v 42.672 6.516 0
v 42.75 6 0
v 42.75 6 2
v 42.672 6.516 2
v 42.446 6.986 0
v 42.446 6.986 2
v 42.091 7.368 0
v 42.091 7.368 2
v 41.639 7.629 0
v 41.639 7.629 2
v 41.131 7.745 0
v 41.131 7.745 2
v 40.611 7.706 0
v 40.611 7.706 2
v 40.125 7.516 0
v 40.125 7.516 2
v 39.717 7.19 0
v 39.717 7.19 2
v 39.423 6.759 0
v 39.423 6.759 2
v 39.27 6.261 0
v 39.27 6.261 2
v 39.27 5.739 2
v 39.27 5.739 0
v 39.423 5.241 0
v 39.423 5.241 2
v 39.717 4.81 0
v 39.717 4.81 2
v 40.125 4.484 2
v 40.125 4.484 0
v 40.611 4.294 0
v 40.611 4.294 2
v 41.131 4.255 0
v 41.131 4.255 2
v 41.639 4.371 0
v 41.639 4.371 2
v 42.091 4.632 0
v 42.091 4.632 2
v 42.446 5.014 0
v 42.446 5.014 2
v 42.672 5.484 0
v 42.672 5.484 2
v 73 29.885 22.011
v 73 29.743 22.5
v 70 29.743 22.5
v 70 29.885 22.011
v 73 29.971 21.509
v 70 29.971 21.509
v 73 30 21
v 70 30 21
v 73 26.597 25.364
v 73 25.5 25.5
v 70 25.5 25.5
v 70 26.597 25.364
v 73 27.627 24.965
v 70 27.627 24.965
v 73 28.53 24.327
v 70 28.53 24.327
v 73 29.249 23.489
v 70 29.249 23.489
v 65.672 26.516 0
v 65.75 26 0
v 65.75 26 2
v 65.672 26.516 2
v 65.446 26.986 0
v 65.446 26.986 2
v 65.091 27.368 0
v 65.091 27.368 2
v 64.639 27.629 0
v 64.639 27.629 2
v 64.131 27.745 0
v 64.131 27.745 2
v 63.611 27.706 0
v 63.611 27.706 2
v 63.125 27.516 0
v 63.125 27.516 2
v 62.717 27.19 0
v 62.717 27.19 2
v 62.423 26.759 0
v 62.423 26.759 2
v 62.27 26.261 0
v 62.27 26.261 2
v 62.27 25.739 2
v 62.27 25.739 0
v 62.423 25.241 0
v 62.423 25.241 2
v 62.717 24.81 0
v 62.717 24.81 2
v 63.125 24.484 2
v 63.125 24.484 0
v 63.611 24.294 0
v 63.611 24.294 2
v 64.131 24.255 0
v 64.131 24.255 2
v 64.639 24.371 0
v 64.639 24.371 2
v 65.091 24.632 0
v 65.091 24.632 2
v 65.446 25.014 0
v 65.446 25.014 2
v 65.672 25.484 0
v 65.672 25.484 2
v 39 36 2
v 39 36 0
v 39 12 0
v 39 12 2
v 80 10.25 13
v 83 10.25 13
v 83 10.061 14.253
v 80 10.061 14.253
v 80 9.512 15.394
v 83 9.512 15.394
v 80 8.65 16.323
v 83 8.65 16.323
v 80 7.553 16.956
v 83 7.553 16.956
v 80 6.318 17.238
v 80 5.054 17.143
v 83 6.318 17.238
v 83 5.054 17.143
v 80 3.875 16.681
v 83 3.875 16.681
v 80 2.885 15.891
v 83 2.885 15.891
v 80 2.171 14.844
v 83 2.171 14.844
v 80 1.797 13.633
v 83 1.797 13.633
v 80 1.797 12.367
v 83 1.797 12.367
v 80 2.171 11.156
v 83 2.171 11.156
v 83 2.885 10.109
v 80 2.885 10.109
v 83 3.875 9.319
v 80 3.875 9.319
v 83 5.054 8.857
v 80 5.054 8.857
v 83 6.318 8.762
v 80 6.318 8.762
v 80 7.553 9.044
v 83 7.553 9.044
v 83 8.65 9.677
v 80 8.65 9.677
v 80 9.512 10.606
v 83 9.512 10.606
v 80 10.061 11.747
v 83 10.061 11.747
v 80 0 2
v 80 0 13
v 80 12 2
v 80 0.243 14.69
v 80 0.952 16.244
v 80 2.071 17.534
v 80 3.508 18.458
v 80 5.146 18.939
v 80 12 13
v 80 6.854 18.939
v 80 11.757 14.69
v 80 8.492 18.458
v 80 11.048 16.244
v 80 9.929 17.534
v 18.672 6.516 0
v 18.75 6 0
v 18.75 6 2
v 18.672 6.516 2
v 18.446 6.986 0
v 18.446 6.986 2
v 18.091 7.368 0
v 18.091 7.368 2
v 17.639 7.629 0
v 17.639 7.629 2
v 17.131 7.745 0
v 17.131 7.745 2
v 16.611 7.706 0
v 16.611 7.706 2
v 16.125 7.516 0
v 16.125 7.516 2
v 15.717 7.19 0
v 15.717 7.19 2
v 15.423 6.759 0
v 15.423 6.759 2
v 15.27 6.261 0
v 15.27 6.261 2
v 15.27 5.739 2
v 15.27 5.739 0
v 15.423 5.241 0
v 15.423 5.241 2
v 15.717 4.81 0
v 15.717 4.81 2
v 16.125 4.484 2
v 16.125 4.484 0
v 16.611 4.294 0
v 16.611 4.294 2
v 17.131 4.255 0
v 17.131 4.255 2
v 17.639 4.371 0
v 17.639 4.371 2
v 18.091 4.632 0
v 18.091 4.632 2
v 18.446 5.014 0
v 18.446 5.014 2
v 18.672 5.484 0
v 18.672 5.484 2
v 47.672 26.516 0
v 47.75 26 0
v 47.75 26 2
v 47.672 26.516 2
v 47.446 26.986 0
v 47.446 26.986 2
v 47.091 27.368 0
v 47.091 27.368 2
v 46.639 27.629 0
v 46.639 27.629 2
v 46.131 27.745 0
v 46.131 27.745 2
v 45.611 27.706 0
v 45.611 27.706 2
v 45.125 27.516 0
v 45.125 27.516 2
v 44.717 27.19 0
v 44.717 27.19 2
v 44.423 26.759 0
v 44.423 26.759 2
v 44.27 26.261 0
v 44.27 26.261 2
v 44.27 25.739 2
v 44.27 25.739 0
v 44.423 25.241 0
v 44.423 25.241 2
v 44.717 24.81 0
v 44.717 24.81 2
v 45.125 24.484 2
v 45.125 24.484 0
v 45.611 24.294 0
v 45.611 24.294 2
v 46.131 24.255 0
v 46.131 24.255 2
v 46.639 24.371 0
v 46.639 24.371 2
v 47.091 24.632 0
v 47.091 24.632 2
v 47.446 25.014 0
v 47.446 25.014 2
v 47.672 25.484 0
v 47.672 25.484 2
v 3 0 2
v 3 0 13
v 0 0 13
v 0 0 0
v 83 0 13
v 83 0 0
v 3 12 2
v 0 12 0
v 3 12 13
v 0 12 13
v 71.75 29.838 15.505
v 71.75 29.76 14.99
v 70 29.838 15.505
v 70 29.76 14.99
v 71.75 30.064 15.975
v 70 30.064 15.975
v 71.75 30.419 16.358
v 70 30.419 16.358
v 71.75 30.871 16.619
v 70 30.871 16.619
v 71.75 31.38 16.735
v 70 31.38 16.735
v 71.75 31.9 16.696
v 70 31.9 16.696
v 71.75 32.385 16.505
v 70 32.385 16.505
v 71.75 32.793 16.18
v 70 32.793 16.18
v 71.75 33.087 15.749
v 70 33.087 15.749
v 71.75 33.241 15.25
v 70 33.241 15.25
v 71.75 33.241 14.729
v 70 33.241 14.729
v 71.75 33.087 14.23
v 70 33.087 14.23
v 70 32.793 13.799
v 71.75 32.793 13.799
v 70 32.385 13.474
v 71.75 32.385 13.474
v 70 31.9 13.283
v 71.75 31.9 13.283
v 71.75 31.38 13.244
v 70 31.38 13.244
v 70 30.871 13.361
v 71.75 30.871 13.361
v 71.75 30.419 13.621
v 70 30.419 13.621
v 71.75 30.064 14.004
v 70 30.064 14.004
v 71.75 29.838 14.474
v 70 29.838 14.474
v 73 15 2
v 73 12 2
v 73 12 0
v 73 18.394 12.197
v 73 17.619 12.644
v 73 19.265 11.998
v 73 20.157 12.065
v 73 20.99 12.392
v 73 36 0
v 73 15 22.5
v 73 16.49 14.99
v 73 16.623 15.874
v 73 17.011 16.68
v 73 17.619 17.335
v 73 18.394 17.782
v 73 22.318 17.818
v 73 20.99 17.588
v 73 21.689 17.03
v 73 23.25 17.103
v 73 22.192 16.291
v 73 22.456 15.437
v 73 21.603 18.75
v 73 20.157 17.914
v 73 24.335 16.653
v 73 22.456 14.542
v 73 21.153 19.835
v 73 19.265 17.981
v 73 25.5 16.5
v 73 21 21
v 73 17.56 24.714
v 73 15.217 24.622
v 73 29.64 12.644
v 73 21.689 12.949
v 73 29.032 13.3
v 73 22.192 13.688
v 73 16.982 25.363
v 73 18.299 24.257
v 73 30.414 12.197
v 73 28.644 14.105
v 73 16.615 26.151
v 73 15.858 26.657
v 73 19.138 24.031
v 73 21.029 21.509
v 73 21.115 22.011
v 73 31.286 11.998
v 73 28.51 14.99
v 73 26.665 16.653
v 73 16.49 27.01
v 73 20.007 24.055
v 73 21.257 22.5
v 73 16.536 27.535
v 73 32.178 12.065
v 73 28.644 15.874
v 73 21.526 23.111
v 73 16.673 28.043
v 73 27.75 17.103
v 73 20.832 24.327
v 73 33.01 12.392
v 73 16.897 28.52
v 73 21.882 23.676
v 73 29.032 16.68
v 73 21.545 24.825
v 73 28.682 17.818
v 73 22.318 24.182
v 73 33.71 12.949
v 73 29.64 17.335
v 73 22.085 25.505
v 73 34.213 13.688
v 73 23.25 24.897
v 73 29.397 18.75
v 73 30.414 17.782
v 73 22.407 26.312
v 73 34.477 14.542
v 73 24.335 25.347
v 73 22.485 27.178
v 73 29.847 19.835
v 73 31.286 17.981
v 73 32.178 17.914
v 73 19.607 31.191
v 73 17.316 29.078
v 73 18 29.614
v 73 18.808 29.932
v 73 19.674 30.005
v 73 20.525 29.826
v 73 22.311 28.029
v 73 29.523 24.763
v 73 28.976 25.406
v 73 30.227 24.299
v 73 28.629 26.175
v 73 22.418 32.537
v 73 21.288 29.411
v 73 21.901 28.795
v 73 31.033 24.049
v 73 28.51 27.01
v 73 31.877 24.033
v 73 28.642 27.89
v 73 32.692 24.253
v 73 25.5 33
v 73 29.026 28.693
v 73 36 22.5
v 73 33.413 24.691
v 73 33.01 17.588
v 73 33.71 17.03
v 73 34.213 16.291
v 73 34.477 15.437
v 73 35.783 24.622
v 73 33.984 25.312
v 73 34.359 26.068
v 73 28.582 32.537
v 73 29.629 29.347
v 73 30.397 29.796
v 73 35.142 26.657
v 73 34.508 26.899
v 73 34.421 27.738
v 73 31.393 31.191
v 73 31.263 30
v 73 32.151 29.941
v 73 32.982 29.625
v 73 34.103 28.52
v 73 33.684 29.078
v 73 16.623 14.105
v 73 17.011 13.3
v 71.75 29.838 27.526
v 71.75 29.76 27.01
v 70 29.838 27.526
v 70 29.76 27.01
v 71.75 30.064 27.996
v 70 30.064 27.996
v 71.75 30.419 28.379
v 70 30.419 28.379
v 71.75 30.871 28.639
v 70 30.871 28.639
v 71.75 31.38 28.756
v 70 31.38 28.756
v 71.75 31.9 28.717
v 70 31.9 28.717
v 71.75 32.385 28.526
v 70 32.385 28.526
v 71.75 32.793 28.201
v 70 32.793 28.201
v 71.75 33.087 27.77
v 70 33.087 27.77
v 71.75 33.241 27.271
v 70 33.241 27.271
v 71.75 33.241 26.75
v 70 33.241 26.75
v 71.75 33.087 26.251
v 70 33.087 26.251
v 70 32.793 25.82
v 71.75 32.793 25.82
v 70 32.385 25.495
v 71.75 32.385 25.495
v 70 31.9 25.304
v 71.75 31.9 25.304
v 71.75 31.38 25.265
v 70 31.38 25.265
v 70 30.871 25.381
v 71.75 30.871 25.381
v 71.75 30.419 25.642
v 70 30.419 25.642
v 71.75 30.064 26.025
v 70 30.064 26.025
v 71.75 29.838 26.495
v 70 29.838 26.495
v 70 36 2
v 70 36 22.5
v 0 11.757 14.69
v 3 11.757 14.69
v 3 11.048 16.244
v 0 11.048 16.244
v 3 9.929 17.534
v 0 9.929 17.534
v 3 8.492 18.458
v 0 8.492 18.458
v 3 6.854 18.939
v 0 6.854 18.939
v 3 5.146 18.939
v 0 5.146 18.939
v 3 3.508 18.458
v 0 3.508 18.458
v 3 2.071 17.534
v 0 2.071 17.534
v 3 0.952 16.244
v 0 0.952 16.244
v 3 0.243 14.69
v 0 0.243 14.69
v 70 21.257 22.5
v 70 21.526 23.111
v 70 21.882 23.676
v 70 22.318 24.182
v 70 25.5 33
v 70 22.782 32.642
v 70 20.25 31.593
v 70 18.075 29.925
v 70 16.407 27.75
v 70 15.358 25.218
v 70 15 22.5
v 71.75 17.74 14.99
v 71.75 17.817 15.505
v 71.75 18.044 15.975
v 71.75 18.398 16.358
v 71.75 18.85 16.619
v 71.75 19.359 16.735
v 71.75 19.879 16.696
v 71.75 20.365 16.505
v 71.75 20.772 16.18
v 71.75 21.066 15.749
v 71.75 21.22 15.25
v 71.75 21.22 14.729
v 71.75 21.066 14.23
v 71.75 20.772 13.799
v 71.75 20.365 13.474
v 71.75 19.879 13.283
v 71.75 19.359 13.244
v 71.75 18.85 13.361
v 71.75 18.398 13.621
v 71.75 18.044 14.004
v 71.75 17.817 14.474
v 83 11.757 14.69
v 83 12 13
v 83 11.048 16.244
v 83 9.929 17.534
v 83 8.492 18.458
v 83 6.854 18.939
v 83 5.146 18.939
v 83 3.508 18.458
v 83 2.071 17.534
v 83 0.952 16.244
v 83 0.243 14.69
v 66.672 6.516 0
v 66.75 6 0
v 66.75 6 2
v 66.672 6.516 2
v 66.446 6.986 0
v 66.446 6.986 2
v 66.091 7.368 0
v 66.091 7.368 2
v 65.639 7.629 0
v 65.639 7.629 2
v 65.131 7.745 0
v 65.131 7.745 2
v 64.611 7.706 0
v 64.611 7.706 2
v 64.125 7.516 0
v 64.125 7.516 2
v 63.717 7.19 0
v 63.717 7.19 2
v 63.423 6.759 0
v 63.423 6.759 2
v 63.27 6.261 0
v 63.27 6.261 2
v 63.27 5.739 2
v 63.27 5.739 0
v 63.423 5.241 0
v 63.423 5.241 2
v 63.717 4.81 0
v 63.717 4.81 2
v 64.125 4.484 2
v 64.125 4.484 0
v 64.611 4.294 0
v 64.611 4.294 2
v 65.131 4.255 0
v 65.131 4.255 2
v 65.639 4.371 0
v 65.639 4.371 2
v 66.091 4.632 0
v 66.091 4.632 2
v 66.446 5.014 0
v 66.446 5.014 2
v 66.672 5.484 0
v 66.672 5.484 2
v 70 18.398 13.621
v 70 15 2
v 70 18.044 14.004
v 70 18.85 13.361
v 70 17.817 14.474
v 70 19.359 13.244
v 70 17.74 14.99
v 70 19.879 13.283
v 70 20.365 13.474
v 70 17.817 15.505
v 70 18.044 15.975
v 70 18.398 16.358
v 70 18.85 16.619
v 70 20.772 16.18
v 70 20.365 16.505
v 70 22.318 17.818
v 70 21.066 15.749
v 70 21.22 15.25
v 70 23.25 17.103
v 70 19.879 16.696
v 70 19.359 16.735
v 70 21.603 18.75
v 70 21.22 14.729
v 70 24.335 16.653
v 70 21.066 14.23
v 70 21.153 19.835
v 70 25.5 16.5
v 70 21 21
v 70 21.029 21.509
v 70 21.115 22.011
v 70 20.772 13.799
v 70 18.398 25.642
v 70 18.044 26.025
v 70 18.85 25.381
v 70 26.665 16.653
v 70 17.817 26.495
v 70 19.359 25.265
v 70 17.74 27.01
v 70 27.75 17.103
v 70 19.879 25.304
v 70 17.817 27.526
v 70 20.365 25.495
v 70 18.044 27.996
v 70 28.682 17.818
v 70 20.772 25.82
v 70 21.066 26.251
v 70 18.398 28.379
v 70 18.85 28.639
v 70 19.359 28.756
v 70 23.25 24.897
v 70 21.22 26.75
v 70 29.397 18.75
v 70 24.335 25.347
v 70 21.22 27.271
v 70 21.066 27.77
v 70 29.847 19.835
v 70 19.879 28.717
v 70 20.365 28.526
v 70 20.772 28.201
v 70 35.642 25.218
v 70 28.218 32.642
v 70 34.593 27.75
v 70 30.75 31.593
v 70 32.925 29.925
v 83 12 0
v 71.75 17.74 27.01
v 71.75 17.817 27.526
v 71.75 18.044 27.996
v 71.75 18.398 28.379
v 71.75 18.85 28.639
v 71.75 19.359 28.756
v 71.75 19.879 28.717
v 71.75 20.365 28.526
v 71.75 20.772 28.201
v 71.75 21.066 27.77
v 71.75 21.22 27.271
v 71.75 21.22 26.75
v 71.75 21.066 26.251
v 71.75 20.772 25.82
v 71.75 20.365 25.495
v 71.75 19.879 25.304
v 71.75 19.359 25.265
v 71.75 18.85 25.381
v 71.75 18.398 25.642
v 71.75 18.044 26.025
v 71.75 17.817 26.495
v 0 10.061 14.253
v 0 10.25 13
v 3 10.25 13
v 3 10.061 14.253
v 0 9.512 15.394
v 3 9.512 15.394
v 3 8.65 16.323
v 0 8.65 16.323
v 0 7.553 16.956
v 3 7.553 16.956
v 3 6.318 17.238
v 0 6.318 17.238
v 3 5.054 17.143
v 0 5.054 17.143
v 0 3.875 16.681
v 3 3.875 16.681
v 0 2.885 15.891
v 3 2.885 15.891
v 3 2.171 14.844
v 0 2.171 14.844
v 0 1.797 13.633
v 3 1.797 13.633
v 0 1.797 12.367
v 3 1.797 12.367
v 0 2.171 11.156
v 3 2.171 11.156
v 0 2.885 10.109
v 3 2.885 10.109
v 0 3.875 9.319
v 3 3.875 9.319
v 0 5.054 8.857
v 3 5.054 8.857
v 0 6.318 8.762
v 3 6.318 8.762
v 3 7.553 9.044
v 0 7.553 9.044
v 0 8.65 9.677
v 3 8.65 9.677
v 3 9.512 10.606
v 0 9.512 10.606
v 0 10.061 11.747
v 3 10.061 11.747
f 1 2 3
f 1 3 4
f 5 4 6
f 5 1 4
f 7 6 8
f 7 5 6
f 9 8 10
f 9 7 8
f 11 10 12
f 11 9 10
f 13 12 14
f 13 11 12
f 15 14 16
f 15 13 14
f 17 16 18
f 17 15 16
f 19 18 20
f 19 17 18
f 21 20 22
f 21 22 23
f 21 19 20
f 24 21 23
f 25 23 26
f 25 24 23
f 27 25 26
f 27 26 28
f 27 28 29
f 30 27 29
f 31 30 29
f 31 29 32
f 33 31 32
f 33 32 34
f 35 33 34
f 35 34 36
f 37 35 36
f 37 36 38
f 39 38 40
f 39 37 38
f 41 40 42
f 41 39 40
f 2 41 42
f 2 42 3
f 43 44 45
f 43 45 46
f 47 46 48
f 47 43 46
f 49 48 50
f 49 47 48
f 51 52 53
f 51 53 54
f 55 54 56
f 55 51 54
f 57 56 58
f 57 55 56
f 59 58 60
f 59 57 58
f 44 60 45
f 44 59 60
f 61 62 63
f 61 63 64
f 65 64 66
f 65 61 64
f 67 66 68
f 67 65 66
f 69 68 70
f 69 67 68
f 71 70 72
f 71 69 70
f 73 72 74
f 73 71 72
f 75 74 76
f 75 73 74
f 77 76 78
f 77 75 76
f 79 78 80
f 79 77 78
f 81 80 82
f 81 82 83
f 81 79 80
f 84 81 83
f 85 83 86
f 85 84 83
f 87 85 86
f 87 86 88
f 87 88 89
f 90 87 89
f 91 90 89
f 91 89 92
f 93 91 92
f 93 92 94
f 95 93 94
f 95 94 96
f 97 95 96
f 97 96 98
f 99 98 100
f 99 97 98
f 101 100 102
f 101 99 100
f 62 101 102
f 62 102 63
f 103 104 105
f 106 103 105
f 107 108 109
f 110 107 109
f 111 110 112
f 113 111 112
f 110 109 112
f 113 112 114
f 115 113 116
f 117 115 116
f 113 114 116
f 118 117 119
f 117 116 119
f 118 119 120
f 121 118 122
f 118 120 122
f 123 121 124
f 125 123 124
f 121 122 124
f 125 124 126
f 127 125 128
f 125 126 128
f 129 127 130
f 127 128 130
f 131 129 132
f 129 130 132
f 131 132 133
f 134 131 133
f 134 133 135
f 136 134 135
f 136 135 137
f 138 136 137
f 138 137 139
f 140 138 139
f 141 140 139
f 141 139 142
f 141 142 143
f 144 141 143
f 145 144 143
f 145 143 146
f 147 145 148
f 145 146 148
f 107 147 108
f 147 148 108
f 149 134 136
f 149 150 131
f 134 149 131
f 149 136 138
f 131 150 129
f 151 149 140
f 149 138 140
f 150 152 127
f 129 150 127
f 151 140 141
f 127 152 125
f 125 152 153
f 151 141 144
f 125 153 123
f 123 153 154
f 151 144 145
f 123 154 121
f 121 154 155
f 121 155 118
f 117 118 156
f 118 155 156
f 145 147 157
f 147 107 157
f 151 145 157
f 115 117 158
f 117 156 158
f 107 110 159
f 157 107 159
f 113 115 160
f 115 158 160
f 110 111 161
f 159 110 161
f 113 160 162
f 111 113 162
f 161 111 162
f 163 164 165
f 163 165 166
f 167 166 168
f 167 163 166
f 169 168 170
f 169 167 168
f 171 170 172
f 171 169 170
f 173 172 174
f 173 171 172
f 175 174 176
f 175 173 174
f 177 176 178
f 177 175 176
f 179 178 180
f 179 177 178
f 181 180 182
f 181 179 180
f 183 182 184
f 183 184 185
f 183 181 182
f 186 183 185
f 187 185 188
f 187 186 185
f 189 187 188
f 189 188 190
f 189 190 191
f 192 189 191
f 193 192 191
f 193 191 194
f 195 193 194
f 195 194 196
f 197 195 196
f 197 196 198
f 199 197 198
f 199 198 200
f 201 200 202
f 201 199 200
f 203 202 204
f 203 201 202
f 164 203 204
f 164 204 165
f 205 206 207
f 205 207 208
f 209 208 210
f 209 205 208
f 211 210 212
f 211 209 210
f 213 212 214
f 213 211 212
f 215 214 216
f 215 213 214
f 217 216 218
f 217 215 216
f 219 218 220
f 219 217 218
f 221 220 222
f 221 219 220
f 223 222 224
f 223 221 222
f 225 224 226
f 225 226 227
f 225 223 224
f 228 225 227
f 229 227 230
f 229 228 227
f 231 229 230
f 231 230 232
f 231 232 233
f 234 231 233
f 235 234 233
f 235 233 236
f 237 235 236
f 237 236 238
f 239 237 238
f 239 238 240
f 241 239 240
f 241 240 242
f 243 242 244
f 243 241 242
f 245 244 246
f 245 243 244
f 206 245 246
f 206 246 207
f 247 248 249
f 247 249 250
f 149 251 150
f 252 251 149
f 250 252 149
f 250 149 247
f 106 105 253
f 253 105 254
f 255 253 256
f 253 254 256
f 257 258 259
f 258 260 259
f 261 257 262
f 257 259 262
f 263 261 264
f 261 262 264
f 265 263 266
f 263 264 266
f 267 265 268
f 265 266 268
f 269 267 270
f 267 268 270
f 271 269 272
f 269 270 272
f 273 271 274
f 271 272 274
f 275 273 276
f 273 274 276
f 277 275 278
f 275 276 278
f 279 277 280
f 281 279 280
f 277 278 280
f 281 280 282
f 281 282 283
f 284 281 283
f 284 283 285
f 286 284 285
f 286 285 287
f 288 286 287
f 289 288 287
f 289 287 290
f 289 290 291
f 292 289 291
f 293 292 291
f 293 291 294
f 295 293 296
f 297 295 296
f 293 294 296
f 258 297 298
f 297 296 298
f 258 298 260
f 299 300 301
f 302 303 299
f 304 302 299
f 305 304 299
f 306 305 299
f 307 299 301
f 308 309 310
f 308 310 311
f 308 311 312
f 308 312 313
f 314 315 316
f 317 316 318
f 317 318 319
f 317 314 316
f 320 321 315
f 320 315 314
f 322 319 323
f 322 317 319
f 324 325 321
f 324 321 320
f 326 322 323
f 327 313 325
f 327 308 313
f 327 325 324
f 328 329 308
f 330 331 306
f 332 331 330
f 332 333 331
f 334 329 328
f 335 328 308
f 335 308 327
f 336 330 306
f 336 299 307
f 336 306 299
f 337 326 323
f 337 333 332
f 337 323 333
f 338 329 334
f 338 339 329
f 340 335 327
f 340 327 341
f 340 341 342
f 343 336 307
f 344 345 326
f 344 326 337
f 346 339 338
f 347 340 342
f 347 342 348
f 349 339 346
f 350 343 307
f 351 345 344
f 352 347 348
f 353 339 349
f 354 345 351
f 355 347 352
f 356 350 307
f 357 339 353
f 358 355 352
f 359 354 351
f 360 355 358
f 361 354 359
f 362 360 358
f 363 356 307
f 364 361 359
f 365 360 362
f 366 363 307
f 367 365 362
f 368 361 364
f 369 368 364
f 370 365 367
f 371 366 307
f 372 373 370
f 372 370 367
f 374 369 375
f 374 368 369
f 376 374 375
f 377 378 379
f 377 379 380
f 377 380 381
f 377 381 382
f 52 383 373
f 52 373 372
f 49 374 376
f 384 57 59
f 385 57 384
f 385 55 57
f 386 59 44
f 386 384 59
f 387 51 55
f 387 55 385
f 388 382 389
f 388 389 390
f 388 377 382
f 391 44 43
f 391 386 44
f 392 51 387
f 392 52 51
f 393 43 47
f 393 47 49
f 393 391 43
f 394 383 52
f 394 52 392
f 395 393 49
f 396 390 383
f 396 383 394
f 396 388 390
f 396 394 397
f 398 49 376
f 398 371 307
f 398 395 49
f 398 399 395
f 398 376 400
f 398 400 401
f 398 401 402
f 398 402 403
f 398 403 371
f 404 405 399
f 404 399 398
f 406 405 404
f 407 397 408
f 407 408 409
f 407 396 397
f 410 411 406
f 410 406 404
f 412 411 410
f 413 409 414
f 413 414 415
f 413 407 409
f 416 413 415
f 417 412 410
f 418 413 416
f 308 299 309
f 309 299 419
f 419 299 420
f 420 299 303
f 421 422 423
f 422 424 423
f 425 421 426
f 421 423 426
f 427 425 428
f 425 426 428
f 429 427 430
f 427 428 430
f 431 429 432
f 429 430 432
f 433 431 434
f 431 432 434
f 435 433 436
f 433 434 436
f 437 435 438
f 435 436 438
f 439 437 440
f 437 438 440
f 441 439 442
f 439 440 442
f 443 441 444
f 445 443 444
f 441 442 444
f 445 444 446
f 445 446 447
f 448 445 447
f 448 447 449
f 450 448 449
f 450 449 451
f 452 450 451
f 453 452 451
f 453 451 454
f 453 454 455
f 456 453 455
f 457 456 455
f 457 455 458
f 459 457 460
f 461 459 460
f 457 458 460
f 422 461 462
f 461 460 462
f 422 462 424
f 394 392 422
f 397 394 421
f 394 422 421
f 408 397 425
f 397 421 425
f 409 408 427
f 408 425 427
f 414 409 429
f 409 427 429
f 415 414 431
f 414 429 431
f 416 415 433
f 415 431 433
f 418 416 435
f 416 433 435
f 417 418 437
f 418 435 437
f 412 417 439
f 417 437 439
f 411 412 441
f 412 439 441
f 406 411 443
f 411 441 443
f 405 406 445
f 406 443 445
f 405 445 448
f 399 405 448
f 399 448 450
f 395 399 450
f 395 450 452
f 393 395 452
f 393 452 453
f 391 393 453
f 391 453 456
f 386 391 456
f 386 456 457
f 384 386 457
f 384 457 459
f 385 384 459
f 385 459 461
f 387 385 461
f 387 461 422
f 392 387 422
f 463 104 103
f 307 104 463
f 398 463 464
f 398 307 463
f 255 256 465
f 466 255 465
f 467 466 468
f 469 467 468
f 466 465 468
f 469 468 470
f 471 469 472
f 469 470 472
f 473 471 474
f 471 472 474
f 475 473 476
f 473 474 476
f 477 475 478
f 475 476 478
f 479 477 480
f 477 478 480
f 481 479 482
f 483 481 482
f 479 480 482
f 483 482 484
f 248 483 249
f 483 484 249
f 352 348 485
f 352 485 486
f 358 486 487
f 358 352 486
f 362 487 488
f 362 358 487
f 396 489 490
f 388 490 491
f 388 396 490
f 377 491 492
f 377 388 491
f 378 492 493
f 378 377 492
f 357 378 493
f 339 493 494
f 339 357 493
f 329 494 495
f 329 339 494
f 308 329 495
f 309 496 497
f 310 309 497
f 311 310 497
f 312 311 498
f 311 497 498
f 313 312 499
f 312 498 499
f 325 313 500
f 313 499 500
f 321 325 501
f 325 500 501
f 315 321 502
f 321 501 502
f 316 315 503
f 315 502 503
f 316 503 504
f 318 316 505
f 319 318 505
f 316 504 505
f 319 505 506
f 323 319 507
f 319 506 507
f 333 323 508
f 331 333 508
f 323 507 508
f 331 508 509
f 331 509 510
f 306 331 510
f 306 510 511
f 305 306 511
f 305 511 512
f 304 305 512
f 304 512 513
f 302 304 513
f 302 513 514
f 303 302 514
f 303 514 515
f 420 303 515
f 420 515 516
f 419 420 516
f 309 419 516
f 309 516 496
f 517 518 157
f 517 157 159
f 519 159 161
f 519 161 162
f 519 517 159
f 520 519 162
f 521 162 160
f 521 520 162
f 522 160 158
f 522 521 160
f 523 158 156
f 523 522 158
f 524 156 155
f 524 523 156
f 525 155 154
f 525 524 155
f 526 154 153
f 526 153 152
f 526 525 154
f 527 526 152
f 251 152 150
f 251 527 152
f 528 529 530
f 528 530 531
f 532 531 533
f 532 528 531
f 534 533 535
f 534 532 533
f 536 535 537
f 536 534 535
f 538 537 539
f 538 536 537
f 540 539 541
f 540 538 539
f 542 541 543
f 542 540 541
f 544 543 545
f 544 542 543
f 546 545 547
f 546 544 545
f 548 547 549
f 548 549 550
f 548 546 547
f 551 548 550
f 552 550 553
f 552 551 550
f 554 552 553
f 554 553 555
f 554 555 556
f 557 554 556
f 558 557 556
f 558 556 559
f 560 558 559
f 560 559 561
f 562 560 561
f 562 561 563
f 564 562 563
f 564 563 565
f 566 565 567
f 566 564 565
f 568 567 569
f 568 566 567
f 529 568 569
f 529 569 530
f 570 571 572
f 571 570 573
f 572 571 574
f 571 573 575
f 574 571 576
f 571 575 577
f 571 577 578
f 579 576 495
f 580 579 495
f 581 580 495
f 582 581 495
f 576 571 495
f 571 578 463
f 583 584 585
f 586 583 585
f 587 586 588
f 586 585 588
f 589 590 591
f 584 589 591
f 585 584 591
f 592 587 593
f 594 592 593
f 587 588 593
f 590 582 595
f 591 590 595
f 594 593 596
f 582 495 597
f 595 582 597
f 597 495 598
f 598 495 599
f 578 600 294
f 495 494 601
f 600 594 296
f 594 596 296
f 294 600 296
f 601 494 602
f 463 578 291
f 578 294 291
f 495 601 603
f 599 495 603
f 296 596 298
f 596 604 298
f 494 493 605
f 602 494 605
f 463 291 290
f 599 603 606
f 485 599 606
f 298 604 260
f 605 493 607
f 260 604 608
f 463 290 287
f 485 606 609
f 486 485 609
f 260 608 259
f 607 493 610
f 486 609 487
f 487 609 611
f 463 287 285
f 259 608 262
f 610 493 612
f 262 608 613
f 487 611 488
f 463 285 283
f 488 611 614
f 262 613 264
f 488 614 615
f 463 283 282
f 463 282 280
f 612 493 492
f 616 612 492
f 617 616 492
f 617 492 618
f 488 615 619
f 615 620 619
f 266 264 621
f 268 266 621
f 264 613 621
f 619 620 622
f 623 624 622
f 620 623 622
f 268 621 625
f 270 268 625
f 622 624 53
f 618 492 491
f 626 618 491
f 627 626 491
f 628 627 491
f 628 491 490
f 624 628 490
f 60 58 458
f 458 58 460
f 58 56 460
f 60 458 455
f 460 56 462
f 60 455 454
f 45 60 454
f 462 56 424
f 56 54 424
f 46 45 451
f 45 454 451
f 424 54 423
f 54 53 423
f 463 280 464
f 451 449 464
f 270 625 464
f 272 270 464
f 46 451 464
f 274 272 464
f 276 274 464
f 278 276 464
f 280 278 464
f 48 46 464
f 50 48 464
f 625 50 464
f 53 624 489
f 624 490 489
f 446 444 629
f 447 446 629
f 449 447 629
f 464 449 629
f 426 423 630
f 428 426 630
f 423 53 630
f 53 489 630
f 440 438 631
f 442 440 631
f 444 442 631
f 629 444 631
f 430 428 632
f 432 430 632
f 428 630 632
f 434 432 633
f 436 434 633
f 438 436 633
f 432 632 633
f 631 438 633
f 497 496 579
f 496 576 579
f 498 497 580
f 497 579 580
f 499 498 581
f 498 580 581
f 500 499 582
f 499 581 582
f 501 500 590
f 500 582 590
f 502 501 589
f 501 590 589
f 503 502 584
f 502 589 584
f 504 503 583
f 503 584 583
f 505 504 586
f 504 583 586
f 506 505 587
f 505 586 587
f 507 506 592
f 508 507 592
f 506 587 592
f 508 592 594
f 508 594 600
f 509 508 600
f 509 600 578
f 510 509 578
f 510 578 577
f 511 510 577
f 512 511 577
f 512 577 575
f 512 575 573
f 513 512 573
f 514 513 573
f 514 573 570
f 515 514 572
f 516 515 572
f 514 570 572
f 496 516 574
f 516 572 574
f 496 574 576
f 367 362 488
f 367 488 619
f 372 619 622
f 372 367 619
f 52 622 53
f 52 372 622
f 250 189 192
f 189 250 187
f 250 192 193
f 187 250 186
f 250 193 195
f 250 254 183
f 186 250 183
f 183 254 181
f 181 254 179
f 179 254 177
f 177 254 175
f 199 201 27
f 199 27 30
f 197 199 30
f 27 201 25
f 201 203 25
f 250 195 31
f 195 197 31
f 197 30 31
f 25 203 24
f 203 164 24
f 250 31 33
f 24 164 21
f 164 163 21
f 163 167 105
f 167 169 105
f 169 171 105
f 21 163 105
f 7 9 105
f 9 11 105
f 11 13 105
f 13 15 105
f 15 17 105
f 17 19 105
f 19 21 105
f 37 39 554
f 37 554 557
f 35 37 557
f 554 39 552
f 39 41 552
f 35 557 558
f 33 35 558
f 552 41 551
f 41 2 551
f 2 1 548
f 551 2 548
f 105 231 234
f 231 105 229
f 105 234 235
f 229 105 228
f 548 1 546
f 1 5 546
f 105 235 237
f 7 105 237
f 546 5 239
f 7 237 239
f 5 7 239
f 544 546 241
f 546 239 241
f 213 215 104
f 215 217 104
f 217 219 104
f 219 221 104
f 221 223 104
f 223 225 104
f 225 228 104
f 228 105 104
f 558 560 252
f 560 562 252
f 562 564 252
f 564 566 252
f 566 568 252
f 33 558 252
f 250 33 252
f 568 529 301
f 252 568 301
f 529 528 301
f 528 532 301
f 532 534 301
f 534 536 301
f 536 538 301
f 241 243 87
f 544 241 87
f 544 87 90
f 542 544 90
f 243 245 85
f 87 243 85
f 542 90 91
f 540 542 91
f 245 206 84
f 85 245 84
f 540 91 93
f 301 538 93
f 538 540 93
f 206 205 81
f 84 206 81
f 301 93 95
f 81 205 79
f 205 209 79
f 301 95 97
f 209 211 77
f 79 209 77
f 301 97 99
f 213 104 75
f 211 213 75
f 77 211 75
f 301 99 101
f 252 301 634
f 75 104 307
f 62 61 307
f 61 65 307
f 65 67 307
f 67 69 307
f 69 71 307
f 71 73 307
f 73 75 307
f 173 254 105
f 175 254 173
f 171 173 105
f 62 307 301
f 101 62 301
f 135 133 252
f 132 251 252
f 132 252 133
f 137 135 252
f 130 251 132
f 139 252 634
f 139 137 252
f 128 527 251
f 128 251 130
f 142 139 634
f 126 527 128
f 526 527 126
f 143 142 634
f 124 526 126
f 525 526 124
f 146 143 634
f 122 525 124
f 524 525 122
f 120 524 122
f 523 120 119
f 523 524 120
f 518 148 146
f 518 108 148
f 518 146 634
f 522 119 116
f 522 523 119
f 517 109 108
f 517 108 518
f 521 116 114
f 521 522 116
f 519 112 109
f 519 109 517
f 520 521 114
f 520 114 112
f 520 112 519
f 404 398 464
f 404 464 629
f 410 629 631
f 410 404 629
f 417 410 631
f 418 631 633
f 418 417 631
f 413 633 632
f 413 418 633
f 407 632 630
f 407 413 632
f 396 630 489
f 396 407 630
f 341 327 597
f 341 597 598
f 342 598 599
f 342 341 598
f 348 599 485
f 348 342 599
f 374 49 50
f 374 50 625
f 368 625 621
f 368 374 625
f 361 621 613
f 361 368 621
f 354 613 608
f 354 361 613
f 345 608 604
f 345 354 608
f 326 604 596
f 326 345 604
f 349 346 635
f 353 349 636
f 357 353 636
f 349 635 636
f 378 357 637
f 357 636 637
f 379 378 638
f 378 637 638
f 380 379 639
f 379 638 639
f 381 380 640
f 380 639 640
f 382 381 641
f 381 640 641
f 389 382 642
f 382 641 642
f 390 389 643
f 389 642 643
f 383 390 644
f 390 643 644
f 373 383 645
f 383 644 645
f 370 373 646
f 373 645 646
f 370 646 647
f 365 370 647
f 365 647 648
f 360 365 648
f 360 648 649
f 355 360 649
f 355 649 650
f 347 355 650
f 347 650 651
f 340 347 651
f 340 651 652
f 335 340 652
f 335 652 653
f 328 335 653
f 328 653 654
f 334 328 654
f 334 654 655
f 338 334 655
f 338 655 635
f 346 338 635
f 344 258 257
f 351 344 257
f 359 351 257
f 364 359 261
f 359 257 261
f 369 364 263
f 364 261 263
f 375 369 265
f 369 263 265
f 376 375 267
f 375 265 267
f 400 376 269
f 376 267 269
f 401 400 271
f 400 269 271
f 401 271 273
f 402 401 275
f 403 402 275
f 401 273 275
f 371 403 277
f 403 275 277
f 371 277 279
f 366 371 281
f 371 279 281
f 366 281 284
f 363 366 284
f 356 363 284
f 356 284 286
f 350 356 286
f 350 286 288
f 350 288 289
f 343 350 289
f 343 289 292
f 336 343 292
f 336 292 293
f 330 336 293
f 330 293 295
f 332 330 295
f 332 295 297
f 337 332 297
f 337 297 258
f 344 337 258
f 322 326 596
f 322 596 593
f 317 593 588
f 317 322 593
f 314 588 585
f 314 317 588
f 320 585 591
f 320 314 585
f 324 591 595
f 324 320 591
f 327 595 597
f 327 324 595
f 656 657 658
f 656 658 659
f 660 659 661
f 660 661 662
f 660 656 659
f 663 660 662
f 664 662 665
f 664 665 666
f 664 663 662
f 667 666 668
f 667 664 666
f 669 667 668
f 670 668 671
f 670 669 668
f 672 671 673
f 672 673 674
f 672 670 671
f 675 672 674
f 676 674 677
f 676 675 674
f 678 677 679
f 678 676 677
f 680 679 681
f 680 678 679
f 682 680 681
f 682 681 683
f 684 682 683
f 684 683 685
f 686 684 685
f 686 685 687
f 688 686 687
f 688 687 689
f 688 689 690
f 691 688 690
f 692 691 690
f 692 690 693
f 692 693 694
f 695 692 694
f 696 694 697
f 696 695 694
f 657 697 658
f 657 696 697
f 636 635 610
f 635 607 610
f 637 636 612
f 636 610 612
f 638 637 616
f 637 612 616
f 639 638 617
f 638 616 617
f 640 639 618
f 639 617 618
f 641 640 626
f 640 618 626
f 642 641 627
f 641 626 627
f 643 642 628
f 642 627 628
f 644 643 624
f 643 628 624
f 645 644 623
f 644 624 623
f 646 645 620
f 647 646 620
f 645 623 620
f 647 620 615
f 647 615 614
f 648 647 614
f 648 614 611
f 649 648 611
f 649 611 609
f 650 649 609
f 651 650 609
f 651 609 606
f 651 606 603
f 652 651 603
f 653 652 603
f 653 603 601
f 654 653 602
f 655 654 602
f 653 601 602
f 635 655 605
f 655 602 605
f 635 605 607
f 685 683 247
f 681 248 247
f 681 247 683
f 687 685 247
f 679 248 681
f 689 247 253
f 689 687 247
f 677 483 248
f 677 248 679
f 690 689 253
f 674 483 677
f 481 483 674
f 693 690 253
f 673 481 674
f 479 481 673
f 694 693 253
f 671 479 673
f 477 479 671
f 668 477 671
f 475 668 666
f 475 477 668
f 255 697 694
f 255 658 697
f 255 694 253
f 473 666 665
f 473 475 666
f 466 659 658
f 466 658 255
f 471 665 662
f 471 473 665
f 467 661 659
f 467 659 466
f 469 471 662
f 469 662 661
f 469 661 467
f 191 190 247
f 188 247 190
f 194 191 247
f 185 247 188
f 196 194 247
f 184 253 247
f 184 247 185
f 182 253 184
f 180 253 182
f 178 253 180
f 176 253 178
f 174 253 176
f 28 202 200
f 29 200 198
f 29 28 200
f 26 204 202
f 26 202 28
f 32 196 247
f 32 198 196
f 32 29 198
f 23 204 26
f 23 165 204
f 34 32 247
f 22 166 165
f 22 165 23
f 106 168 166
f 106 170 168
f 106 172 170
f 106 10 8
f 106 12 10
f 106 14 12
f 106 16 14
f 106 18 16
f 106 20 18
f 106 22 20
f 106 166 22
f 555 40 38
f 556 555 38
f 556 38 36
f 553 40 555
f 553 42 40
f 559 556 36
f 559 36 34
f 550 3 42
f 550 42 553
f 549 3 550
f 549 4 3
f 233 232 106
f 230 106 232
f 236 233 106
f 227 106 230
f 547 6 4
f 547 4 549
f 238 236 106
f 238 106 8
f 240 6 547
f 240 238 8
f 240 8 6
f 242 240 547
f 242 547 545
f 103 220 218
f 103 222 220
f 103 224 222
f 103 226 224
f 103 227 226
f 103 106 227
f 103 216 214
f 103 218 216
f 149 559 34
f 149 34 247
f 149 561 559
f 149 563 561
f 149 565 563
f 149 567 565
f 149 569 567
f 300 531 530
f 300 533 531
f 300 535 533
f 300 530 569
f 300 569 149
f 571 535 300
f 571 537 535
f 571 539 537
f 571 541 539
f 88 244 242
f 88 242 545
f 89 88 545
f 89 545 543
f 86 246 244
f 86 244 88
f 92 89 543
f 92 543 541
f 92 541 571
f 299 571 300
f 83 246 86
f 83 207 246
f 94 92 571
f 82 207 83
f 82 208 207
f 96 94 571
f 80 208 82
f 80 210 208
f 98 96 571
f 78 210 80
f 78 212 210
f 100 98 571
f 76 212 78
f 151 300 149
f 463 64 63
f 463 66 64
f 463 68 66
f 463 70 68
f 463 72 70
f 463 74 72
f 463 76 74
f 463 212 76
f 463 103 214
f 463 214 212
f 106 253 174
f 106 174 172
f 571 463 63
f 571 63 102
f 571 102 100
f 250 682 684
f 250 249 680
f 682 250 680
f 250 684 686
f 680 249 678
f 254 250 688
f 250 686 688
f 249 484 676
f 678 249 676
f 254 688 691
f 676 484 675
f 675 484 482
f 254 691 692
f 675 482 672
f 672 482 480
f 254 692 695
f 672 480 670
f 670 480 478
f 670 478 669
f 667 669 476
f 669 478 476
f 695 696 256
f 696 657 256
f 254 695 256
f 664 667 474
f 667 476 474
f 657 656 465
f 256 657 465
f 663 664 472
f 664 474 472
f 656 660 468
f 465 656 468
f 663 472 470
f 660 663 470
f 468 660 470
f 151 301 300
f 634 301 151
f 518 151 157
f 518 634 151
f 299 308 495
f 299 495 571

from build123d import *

# Parameters (mm, degrees)
F0_R            = 1.75
F1_DEPTH        = 2
F3_R            = 4.25
F4_DEPTH        = 3
F5_R            = 4.25
F6_DEPTH        = 3
F9_DEPTH        = 3
F10_D           = 3.5
F10_CSINK_D     = 6
F10_CSINK_ANGLE = 90


with BuildPart() as f1:
    # F0 (on Top) → F1 (new body)
    with BuildSketch(Plane.XY):
        Polygon((0, 12), (0, 0), (83, 0), (83, 12), (73, 12), (73, 36), (39, 36), (39, 12), align=None)
        with Locations((17, 6)):
            Circle(F0_R, mode=Mode.SUBTRACT)
        with Locations((41, 6)):
            Circle(F0_R, mode=Mode.SUBTRACT)
        with Locations((65, 6)):
            Circle(F0_R, mode=Mode.SUBTRACT)
        with Locations((46, 26)):
            Circle(F0_R, mode=Mode.SUBTRACT)
        with Locations((64, 26)):
            Circle(F0_R, mode=Mode.SUBTRACT)
    extrude(amount=F1_DEPTH)

    # F3 (on Right) → F4 (join)
    with BuildSketch(Plane.YZ):
        with BuildLine():
            Line((0, 13), (0, 0))
            Line((0, 0), (12, 0))
            Line((12, 0), (12, 13))
            ThreePointArc((12, 13), (6, 19), (0, 13))
        make_face()
        with Locations((6, 13)):
            Circle(F3_R, mode=Mode.SUBTRACT)
    extrude(amount=F4_DEPTH)

    # F5 (on offset) → F6 (join)
    with BuildSketch(Plane.YZ.offset(83)):
        with BuildLine():
            Line((0, 13), (0, 0))
            Line((0, 0), (12, 0))
            Line((12, 0), (12, 13))
            ThreePointArc((12, 13), (6, 19), (0, 13))
        make_face()
        with Locations((6, 13)):
            Circle(F5_R, mode=Mode.SUBTRACT)
    extrude(amount=-F6_DEPTH)

    # F8 (on offset) → F9 (join)
    with BuildSketch(Plane.YZ.offset(73)):
        with BuildLine():
            Line((15, 22.5), (15, 0))
            Line((15, 0), (36, 0))
            Line((36, 0), (36, 22.5))
            Line((36, 22.5), (29.742641, 22.5))
            ThreePointArc((29.742641, 22.5), (29.935194, 21.760959), (30, 21))
            ThreePointArc((30, 21), (28.681981, 17.818019), (25.5, 16.5))
            ThreePointArc((25.5, 16.5), (22.318019, 17.818019), (21, 21))
            ThreePointArc((21, 21), (21.064806, 21.760959), (21.257359, 22.5))
            Line((21.257359, 22.5), (15, 22.5))
        make_face()
        with BuildLine():
            ThreePointArc((25.5, 33), (18.075379, 29.924621), (15, 22.5))
            Line((15, 22.5), (21.257359, 22.5))
            ThreePointArc((21.257359, 22.5), (21.693622, 23.400309), (22.318019, 24.181981))
            ThreePointArc((22.318019, 24.181981), (23.777925, 25.157458), (25.5, 25.5))
            Line((25.5, 25.5), (25.5, 33))
        make_face()
        with BuildLine():
            Line((29.742641, 22.5), (36, 22.5))
            ThreePointArc((36, 22.5), (32.924621, 29.924621), (25.5, 33))
            Line((25.5, 33), (25.5, 25.5))
            ThreePointArc((25.5, 25.5), (28.098076, 24.674235), (29.742641, 22.5))
        make_face()
    extrude(amount=-F9_DEPTH)

    # F10 (through all)
    with Locations(Plane.YZ.offset(73)):
        with Locations((31.510408, 14.989592), (19.489592, 14.989592), (19.489592, 27.010408), (31.510408, 27.010408)):
            CounterSinkHole(F10_D / 2, F10_CSINK_D / 2, counter_sink_angle=F10_CSINK_ANGLE)


solid = f1.part
